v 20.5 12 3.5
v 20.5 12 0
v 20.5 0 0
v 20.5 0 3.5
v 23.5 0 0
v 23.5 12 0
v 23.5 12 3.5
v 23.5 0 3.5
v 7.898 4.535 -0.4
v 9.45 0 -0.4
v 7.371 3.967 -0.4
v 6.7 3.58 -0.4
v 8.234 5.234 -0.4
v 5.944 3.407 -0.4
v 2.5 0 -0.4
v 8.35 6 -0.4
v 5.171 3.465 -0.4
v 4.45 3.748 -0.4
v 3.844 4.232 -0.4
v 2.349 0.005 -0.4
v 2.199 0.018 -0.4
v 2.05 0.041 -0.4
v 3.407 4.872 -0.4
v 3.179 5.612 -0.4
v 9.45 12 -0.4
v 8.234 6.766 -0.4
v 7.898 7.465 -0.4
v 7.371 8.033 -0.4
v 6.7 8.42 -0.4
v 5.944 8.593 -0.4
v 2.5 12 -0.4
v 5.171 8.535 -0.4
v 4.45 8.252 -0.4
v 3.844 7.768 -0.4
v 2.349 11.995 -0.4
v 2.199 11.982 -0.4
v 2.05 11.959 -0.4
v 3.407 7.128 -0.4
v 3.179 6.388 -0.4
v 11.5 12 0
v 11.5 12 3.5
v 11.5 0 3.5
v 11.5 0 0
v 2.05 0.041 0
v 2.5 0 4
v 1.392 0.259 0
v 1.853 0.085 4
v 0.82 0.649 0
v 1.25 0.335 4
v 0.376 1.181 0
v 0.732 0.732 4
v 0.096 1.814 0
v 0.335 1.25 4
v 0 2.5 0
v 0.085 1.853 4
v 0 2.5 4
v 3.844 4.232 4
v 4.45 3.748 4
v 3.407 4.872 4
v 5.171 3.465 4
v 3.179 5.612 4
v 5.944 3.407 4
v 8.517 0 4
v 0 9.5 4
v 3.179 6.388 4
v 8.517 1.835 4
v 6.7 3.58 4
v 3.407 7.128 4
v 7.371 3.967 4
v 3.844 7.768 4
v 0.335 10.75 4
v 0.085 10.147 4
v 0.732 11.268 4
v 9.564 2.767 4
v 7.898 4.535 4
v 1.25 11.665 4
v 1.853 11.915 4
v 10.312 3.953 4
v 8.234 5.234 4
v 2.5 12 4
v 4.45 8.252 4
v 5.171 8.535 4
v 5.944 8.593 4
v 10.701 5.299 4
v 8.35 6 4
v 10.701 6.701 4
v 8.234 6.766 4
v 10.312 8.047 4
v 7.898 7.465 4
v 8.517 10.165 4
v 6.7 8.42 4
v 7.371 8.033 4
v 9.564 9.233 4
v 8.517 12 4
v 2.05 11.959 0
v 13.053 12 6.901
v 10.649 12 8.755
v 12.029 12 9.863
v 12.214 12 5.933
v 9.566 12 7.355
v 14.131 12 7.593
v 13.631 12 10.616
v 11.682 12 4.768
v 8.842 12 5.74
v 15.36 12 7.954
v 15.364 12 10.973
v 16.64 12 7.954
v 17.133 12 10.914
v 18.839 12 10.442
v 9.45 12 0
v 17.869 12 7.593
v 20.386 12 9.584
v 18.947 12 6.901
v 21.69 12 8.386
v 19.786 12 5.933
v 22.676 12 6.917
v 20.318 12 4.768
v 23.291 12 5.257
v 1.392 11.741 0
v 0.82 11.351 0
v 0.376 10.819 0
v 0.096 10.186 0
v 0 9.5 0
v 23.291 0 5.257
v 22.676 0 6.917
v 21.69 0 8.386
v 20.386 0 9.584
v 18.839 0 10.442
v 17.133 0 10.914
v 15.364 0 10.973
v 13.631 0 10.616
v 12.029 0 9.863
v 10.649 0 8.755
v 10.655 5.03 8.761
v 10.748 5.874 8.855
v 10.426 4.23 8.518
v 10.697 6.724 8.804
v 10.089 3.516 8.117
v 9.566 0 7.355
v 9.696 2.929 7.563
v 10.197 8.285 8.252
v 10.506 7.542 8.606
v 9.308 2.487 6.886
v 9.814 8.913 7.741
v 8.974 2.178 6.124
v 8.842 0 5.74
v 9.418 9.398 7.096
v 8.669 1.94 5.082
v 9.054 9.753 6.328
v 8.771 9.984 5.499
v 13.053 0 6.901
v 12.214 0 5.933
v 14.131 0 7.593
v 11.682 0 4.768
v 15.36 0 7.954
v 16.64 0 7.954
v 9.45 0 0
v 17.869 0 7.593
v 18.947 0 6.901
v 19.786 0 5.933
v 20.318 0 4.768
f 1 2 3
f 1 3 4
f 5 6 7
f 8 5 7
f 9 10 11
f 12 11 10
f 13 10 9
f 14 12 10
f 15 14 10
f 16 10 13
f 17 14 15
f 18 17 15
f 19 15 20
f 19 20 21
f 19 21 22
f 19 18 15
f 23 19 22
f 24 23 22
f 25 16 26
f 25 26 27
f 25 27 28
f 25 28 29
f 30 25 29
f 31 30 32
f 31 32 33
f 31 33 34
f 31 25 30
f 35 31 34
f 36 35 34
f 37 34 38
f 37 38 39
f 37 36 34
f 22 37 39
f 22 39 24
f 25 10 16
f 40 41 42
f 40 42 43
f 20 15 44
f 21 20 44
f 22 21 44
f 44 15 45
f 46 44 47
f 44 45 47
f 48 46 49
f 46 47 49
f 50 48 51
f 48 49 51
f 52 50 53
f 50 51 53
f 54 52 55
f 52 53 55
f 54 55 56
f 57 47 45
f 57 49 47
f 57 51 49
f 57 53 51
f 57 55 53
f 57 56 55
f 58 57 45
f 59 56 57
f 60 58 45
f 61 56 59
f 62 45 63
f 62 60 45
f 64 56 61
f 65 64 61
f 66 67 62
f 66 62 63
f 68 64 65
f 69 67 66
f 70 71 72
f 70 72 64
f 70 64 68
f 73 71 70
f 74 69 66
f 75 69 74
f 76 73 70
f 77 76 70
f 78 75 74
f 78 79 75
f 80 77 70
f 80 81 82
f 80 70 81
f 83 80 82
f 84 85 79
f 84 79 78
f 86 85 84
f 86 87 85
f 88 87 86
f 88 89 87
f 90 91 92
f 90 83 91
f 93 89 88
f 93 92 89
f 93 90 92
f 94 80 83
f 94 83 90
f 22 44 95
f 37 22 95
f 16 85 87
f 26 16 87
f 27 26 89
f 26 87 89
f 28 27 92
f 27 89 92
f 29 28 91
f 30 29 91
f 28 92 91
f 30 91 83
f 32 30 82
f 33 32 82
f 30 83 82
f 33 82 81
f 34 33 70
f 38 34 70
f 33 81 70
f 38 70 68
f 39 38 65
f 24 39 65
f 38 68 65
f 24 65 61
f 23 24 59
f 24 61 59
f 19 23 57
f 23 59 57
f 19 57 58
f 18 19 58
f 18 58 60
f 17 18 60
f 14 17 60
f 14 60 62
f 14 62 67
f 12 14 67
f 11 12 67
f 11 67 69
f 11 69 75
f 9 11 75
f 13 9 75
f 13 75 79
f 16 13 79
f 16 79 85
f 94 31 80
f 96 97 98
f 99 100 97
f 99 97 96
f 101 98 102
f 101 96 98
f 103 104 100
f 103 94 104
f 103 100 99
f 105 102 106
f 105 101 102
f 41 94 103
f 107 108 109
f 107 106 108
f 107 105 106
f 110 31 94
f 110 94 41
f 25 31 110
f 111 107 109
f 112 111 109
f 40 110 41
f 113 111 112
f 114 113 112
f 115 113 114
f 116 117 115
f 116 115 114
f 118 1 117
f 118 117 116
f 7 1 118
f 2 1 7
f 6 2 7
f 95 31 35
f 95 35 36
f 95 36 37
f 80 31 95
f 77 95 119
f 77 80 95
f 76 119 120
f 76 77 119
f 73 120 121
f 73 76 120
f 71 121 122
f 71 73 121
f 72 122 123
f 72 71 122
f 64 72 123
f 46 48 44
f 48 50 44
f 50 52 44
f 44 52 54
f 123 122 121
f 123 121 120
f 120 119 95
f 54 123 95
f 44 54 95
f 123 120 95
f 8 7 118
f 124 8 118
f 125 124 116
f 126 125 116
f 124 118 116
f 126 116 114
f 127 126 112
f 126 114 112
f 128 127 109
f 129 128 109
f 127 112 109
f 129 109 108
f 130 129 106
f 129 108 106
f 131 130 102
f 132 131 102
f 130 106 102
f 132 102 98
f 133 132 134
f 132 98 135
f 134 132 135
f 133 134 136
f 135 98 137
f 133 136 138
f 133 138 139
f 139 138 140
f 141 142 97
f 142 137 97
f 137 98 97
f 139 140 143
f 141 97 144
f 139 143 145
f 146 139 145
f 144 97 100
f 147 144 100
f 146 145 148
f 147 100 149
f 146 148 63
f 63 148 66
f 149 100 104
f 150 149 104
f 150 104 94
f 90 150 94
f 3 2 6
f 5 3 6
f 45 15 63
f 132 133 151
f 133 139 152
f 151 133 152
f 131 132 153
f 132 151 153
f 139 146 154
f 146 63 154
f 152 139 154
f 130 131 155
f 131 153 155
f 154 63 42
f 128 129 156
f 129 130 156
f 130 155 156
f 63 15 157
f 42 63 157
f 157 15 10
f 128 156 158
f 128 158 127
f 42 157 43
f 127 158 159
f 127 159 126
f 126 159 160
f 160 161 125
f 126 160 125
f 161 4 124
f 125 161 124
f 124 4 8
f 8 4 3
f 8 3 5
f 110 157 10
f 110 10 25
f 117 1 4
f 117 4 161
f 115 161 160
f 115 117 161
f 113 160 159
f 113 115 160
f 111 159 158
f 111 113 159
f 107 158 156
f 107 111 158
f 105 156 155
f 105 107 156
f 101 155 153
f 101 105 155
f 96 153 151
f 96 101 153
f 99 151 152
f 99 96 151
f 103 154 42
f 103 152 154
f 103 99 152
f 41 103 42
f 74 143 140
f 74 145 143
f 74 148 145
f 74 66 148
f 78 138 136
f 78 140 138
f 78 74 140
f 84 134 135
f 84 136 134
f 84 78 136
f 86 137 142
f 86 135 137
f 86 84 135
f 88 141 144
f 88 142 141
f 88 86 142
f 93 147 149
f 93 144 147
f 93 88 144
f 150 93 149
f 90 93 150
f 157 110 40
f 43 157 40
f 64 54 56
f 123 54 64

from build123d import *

# Parameters (mm, degrees)
SKETCH_1_W          = 12
SKETCH_1_H          = 12
EXTRUDE_1_DEPTH     = 4
EXTRUDE_2_DEPTH     = 12
CUT_EXTRUDE_3_DEPTH = 29.587584718
SKETCH_5_W          = 7.4
SKETCH_5_H          = 12
EXTRUDE_3_DEPTH     = 0.4
SKETCH_3_R          = 2.6
CUT_EXTRUDE_1_DEPTH = 28.299267389
SKETCH_4_R          = 5
CUT_EXTRUDE_2_DEPTH = 28.299267389
FILLET_1_R          = 2.5


with BuildPart() as part:
    # Эскиз1 → Бобышка-Вытянуть1 (new body)
    with BuildSketch(Plane.XY):
        with Locations((6, 6)):
            Rectangle(SKETCH_1_W, SKETCH_1_H)
    extrude(amount=EXTRUDE_1_DEPTH)

    # Эскиз2 → Бобышка-Вытянуть2 (add)
    with BuildSketch(Plane(origin=(0, 12, 0), x_dir=(1, 0, 0), z_dir=(0, 1, 0))):
        with BuildLine():
            Line((8.5, 0), (23.5, 0))
            Line((23.5, 0), (23.5, -3.5))
            ThreePointArc((23.5, -3.5), (16, -11), (8.5, -3.5))
            Line((8.5, -3.5), (8.5, 0))
        make_face()
    extrude(amount=-EXTRUDE_2_DEPTH)

    # Эскиз6 → Вырез-Вытянуть3 (cut, through all)
    with BuildSketch(Plane(origin=(0, 12, 0), x_dir=(1, 0, 0), z_dir=(0, 1, 0))):
        with BuildLine():
            Line((11.5, -3.5), (11.5, 0))
            Line((11.5, 0), (20.5, 0))
            Line((20.5, 0), (20.5, -3.5))
            ThreePointArc((20.5, -3.5), (16, -8), (11.5, -3.5))
        make_face()
    extrude(amount=-CUT_EXTRUDE_3_DEPTH, mode=Mode.SUBTRACT)

    # Эскиз5 → Бобышка-Вытянуть3 (add)
    with BuildSketch(Plane(origin=(0, 0, 0), x_dir=(-1, 0, 0), z_dir=(0, 0, -1))):
        with Locations((-5.75, 6)):
            Rectangle(SKETCH_5_W, SKETCH_5_H)
    extrude(amount=EXTRUDE_3_DEPTH)

    # Эскиз3 → Вырез-Вытянуть1 (cut, through all)
    with BuildSketch(Plane.XY.offset(4)):
        with Locations((5.75, 6)):
            Circle(SKETCH_3_R)
    extrude(amount=-CUT_EXTRUDE_1_DEPTH, mode=Mode.SUBTRACT)

    # Эскиз4 → Вырез-Вытянуть2 (cut, through all)
    with BuildSketch(Plane.XY.offset(4)):
        with Locations((5.75, 6)):
            Circle(SKETCH_4_R)
    extrude(amount=CUT_EXTRUDE_2_DEPTH, mode=Mode.SUBTRACT)

    # Скругление1
    fillet_1_edges = [part.edges().sort_by_distance(p)[0] for p in [
        (0, 12, 2),
        (0, 0, 2),
    ]]
    fillet(fillet_1_edges, radius=FILLET_1_R)


solid = part.part
